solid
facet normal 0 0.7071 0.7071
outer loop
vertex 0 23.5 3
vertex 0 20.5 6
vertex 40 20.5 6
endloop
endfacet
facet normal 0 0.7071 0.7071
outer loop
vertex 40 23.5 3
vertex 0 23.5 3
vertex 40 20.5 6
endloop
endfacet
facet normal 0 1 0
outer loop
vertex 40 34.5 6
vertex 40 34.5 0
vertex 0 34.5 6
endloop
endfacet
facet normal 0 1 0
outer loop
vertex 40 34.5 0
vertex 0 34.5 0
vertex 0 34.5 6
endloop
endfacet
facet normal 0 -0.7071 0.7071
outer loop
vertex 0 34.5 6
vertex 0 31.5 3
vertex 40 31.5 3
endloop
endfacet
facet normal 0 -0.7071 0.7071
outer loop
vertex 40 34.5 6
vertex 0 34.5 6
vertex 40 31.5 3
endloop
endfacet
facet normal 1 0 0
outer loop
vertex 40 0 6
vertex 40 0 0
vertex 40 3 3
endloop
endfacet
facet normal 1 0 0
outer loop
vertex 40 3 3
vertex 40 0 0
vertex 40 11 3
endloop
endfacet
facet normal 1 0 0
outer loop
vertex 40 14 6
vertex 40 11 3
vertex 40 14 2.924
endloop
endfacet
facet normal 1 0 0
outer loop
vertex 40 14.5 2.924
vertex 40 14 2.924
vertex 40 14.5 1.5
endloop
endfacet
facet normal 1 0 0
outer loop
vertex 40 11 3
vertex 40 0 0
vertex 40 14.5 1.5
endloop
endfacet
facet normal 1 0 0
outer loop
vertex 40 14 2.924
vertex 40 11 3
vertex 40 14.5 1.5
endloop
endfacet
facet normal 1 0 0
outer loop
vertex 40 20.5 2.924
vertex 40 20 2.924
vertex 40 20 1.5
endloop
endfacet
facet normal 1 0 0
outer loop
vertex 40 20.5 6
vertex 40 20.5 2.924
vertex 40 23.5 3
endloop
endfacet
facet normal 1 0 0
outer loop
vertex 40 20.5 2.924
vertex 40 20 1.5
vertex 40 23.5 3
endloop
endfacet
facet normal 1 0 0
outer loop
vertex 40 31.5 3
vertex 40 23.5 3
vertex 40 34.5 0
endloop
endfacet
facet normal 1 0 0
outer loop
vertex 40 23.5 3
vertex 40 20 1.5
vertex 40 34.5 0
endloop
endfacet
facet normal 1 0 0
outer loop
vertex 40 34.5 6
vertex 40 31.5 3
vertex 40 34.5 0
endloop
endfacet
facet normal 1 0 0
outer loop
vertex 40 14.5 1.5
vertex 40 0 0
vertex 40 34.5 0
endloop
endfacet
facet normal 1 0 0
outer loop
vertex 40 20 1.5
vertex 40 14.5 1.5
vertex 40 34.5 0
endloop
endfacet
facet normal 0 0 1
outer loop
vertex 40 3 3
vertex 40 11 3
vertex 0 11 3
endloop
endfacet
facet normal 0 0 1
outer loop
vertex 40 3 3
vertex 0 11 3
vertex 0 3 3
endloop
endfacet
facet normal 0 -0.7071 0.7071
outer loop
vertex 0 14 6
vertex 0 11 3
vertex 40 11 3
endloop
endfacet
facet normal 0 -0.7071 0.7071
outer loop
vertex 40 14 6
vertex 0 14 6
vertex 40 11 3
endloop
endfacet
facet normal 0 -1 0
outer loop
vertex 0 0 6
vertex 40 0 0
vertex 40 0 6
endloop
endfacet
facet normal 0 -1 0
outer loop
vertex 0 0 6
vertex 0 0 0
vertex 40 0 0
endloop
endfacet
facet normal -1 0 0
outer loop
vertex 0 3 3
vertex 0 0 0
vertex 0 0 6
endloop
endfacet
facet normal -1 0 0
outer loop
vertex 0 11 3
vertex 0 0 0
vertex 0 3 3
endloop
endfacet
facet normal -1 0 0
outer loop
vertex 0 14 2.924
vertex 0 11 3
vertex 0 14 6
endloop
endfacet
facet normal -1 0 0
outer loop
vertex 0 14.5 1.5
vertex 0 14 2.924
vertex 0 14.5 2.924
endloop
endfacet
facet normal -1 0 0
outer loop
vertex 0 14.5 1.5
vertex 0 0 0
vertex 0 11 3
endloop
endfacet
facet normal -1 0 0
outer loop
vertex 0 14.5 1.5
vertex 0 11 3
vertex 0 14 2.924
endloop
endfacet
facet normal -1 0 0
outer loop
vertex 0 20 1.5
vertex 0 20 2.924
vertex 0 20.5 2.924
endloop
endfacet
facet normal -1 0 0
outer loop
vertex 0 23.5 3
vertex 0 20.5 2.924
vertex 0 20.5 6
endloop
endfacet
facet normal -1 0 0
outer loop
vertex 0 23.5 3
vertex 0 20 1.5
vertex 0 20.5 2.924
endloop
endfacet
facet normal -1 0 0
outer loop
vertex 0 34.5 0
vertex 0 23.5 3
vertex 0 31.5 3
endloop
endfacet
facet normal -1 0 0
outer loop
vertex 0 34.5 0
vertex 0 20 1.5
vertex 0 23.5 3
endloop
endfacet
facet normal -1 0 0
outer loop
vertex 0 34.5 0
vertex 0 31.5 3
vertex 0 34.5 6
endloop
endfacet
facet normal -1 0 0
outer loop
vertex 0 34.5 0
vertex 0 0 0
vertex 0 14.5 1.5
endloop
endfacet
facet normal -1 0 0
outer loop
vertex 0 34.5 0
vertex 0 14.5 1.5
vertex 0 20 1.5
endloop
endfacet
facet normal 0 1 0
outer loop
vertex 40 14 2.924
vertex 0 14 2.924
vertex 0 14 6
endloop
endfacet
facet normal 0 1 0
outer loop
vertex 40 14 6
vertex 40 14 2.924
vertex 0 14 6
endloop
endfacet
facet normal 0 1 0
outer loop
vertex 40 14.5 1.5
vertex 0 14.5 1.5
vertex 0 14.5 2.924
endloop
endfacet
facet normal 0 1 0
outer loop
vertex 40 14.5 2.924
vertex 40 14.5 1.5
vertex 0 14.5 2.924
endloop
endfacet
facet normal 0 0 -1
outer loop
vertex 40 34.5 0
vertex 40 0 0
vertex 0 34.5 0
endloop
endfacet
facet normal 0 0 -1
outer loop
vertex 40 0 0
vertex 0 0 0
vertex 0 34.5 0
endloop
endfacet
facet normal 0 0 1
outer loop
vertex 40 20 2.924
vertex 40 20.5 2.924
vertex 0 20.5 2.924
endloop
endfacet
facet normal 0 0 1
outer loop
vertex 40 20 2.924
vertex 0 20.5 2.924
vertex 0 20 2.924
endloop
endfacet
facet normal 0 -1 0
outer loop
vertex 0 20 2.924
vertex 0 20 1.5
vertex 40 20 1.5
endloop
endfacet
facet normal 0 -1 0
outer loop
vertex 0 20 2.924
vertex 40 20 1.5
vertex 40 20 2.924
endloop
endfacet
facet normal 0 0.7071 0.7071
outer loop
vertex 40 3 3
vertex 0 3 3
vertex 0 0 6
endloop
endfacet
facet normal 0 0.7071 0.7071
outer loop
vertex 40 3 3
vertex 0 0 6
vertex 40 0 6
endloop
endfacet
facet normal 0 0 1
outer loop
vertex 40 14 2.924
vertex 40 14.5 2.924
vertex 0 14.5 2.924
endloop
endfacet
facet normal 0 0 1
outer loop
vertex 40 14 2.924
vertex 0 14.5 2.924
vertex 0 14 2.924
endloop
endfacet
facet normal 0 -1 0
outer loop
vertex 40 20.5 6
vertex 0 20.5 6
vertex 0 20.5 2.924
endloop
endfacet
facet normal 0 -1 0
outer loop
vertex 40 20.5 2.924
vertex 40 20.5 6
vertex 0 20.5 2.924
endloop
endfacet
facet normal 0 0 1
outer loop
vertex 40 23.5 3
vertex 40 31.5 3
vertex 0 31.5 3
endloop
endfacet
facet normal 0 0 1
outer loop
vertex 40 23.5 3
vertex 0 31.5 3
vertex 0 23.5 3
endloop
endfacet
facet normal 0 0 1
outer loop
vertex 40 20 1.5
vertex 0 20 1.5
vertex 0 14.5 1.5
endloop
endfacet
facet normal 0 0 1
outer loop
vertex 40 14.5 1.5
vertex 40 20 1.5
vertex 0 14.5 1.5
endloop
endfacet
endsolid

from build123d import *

# Parameters (mm, degrees)
F0_W     = 20
F0_H     = 34.5
F1_DEPTH = 6
F2_DEPTH = 20
F3_W     = 5.5
F3_H     = 3.0757111441
F3_W_2   = 0.5
F3_H_2   = 1.4242888559
F4_DEPTH = 50
F5_W     = 8
F5_H     = 3
F6_DEPTH = 50
F7_SIZE  = 2.99999


# Not quite as in the source:
# - a fillet or chamfer is up to 0.001 mm smaller than in the source, because OpenCascade refuses the exact size


with BuildPart() as f1:
    # F0 (on Top) → F1 (new body)
    with BuildSketch(Plane.XY):
        with Locations((10, 17.25)):
            Rectangle(F0_W, F0_H)
    extrude(amount=F1_DEPTH)

    # F2 (add): a face of the model
    f2_faces = [f1.faces().sort_by_distance(p)[0] for p in [
        (20, 17.25, 3),
    ]]
    extrude(f2_faces, amount=F2_DEPTH)

    # F3 (on face) → F4 (cut)
    with BuildSketch(Plane(origin=(0, 0, 0), x_dir=(0, -1, 0), z_dir=(-1, 0, 0))):
        Polygon((-20, 6.5), (-14.5, 6.5), (-14.5, 6), (-14, 6), (-14, 9.0350331739), (-20.5, 9.0350331739), (-20.5, 6), (-20, 6), align=None)
        with Locations((-17.25, 4.4621444279)):
            Rectangle(F3_W, F3_H)
        with Locations((-14.25, 4.4621444279)):
            Rectangle(F3_W_2, F3_H)
        with Locations((-20.25, 4.4621444279)):
            Rectangle(F3_W_2, F3_H)
        with Locations((-17.25, 2.2121444279)):
            Rectangle(F3_W, F3_H_2)
    extrude(amount=-F4_DEPTH, mode=Mode.SUBTRACT)

    # F5 (on face) → F6 (cut)
    with BuildSketch(Plane(origin=(0, 0, 0), x_dir=(0, -1, 0), z_dir=(-1, 0, 0))):
        with Locations((-27.5, 4.5)):
            Rectangle(F5_W, F5_H)
        with Locations((-7, 4.5)):
            Rectangle(F5_W, F5_H)
    extrude(amount=-F6_DEPTH, mode=Mode.SUBTRACT)

    # F7 (size 3 in the source; OpenCascade refuses exactly that, so slightly less here)
    f7_edges = [f1.edges().sort_by_distance(p)[0] for p in [
        (20, 11, 6),
        (20, 3, 6),
        (20, 31.5, 6),
        (20, 23.5, 6),
    ]]
    chamfer(f7_edges, length=F7_SIZE)


solid = f1.part
